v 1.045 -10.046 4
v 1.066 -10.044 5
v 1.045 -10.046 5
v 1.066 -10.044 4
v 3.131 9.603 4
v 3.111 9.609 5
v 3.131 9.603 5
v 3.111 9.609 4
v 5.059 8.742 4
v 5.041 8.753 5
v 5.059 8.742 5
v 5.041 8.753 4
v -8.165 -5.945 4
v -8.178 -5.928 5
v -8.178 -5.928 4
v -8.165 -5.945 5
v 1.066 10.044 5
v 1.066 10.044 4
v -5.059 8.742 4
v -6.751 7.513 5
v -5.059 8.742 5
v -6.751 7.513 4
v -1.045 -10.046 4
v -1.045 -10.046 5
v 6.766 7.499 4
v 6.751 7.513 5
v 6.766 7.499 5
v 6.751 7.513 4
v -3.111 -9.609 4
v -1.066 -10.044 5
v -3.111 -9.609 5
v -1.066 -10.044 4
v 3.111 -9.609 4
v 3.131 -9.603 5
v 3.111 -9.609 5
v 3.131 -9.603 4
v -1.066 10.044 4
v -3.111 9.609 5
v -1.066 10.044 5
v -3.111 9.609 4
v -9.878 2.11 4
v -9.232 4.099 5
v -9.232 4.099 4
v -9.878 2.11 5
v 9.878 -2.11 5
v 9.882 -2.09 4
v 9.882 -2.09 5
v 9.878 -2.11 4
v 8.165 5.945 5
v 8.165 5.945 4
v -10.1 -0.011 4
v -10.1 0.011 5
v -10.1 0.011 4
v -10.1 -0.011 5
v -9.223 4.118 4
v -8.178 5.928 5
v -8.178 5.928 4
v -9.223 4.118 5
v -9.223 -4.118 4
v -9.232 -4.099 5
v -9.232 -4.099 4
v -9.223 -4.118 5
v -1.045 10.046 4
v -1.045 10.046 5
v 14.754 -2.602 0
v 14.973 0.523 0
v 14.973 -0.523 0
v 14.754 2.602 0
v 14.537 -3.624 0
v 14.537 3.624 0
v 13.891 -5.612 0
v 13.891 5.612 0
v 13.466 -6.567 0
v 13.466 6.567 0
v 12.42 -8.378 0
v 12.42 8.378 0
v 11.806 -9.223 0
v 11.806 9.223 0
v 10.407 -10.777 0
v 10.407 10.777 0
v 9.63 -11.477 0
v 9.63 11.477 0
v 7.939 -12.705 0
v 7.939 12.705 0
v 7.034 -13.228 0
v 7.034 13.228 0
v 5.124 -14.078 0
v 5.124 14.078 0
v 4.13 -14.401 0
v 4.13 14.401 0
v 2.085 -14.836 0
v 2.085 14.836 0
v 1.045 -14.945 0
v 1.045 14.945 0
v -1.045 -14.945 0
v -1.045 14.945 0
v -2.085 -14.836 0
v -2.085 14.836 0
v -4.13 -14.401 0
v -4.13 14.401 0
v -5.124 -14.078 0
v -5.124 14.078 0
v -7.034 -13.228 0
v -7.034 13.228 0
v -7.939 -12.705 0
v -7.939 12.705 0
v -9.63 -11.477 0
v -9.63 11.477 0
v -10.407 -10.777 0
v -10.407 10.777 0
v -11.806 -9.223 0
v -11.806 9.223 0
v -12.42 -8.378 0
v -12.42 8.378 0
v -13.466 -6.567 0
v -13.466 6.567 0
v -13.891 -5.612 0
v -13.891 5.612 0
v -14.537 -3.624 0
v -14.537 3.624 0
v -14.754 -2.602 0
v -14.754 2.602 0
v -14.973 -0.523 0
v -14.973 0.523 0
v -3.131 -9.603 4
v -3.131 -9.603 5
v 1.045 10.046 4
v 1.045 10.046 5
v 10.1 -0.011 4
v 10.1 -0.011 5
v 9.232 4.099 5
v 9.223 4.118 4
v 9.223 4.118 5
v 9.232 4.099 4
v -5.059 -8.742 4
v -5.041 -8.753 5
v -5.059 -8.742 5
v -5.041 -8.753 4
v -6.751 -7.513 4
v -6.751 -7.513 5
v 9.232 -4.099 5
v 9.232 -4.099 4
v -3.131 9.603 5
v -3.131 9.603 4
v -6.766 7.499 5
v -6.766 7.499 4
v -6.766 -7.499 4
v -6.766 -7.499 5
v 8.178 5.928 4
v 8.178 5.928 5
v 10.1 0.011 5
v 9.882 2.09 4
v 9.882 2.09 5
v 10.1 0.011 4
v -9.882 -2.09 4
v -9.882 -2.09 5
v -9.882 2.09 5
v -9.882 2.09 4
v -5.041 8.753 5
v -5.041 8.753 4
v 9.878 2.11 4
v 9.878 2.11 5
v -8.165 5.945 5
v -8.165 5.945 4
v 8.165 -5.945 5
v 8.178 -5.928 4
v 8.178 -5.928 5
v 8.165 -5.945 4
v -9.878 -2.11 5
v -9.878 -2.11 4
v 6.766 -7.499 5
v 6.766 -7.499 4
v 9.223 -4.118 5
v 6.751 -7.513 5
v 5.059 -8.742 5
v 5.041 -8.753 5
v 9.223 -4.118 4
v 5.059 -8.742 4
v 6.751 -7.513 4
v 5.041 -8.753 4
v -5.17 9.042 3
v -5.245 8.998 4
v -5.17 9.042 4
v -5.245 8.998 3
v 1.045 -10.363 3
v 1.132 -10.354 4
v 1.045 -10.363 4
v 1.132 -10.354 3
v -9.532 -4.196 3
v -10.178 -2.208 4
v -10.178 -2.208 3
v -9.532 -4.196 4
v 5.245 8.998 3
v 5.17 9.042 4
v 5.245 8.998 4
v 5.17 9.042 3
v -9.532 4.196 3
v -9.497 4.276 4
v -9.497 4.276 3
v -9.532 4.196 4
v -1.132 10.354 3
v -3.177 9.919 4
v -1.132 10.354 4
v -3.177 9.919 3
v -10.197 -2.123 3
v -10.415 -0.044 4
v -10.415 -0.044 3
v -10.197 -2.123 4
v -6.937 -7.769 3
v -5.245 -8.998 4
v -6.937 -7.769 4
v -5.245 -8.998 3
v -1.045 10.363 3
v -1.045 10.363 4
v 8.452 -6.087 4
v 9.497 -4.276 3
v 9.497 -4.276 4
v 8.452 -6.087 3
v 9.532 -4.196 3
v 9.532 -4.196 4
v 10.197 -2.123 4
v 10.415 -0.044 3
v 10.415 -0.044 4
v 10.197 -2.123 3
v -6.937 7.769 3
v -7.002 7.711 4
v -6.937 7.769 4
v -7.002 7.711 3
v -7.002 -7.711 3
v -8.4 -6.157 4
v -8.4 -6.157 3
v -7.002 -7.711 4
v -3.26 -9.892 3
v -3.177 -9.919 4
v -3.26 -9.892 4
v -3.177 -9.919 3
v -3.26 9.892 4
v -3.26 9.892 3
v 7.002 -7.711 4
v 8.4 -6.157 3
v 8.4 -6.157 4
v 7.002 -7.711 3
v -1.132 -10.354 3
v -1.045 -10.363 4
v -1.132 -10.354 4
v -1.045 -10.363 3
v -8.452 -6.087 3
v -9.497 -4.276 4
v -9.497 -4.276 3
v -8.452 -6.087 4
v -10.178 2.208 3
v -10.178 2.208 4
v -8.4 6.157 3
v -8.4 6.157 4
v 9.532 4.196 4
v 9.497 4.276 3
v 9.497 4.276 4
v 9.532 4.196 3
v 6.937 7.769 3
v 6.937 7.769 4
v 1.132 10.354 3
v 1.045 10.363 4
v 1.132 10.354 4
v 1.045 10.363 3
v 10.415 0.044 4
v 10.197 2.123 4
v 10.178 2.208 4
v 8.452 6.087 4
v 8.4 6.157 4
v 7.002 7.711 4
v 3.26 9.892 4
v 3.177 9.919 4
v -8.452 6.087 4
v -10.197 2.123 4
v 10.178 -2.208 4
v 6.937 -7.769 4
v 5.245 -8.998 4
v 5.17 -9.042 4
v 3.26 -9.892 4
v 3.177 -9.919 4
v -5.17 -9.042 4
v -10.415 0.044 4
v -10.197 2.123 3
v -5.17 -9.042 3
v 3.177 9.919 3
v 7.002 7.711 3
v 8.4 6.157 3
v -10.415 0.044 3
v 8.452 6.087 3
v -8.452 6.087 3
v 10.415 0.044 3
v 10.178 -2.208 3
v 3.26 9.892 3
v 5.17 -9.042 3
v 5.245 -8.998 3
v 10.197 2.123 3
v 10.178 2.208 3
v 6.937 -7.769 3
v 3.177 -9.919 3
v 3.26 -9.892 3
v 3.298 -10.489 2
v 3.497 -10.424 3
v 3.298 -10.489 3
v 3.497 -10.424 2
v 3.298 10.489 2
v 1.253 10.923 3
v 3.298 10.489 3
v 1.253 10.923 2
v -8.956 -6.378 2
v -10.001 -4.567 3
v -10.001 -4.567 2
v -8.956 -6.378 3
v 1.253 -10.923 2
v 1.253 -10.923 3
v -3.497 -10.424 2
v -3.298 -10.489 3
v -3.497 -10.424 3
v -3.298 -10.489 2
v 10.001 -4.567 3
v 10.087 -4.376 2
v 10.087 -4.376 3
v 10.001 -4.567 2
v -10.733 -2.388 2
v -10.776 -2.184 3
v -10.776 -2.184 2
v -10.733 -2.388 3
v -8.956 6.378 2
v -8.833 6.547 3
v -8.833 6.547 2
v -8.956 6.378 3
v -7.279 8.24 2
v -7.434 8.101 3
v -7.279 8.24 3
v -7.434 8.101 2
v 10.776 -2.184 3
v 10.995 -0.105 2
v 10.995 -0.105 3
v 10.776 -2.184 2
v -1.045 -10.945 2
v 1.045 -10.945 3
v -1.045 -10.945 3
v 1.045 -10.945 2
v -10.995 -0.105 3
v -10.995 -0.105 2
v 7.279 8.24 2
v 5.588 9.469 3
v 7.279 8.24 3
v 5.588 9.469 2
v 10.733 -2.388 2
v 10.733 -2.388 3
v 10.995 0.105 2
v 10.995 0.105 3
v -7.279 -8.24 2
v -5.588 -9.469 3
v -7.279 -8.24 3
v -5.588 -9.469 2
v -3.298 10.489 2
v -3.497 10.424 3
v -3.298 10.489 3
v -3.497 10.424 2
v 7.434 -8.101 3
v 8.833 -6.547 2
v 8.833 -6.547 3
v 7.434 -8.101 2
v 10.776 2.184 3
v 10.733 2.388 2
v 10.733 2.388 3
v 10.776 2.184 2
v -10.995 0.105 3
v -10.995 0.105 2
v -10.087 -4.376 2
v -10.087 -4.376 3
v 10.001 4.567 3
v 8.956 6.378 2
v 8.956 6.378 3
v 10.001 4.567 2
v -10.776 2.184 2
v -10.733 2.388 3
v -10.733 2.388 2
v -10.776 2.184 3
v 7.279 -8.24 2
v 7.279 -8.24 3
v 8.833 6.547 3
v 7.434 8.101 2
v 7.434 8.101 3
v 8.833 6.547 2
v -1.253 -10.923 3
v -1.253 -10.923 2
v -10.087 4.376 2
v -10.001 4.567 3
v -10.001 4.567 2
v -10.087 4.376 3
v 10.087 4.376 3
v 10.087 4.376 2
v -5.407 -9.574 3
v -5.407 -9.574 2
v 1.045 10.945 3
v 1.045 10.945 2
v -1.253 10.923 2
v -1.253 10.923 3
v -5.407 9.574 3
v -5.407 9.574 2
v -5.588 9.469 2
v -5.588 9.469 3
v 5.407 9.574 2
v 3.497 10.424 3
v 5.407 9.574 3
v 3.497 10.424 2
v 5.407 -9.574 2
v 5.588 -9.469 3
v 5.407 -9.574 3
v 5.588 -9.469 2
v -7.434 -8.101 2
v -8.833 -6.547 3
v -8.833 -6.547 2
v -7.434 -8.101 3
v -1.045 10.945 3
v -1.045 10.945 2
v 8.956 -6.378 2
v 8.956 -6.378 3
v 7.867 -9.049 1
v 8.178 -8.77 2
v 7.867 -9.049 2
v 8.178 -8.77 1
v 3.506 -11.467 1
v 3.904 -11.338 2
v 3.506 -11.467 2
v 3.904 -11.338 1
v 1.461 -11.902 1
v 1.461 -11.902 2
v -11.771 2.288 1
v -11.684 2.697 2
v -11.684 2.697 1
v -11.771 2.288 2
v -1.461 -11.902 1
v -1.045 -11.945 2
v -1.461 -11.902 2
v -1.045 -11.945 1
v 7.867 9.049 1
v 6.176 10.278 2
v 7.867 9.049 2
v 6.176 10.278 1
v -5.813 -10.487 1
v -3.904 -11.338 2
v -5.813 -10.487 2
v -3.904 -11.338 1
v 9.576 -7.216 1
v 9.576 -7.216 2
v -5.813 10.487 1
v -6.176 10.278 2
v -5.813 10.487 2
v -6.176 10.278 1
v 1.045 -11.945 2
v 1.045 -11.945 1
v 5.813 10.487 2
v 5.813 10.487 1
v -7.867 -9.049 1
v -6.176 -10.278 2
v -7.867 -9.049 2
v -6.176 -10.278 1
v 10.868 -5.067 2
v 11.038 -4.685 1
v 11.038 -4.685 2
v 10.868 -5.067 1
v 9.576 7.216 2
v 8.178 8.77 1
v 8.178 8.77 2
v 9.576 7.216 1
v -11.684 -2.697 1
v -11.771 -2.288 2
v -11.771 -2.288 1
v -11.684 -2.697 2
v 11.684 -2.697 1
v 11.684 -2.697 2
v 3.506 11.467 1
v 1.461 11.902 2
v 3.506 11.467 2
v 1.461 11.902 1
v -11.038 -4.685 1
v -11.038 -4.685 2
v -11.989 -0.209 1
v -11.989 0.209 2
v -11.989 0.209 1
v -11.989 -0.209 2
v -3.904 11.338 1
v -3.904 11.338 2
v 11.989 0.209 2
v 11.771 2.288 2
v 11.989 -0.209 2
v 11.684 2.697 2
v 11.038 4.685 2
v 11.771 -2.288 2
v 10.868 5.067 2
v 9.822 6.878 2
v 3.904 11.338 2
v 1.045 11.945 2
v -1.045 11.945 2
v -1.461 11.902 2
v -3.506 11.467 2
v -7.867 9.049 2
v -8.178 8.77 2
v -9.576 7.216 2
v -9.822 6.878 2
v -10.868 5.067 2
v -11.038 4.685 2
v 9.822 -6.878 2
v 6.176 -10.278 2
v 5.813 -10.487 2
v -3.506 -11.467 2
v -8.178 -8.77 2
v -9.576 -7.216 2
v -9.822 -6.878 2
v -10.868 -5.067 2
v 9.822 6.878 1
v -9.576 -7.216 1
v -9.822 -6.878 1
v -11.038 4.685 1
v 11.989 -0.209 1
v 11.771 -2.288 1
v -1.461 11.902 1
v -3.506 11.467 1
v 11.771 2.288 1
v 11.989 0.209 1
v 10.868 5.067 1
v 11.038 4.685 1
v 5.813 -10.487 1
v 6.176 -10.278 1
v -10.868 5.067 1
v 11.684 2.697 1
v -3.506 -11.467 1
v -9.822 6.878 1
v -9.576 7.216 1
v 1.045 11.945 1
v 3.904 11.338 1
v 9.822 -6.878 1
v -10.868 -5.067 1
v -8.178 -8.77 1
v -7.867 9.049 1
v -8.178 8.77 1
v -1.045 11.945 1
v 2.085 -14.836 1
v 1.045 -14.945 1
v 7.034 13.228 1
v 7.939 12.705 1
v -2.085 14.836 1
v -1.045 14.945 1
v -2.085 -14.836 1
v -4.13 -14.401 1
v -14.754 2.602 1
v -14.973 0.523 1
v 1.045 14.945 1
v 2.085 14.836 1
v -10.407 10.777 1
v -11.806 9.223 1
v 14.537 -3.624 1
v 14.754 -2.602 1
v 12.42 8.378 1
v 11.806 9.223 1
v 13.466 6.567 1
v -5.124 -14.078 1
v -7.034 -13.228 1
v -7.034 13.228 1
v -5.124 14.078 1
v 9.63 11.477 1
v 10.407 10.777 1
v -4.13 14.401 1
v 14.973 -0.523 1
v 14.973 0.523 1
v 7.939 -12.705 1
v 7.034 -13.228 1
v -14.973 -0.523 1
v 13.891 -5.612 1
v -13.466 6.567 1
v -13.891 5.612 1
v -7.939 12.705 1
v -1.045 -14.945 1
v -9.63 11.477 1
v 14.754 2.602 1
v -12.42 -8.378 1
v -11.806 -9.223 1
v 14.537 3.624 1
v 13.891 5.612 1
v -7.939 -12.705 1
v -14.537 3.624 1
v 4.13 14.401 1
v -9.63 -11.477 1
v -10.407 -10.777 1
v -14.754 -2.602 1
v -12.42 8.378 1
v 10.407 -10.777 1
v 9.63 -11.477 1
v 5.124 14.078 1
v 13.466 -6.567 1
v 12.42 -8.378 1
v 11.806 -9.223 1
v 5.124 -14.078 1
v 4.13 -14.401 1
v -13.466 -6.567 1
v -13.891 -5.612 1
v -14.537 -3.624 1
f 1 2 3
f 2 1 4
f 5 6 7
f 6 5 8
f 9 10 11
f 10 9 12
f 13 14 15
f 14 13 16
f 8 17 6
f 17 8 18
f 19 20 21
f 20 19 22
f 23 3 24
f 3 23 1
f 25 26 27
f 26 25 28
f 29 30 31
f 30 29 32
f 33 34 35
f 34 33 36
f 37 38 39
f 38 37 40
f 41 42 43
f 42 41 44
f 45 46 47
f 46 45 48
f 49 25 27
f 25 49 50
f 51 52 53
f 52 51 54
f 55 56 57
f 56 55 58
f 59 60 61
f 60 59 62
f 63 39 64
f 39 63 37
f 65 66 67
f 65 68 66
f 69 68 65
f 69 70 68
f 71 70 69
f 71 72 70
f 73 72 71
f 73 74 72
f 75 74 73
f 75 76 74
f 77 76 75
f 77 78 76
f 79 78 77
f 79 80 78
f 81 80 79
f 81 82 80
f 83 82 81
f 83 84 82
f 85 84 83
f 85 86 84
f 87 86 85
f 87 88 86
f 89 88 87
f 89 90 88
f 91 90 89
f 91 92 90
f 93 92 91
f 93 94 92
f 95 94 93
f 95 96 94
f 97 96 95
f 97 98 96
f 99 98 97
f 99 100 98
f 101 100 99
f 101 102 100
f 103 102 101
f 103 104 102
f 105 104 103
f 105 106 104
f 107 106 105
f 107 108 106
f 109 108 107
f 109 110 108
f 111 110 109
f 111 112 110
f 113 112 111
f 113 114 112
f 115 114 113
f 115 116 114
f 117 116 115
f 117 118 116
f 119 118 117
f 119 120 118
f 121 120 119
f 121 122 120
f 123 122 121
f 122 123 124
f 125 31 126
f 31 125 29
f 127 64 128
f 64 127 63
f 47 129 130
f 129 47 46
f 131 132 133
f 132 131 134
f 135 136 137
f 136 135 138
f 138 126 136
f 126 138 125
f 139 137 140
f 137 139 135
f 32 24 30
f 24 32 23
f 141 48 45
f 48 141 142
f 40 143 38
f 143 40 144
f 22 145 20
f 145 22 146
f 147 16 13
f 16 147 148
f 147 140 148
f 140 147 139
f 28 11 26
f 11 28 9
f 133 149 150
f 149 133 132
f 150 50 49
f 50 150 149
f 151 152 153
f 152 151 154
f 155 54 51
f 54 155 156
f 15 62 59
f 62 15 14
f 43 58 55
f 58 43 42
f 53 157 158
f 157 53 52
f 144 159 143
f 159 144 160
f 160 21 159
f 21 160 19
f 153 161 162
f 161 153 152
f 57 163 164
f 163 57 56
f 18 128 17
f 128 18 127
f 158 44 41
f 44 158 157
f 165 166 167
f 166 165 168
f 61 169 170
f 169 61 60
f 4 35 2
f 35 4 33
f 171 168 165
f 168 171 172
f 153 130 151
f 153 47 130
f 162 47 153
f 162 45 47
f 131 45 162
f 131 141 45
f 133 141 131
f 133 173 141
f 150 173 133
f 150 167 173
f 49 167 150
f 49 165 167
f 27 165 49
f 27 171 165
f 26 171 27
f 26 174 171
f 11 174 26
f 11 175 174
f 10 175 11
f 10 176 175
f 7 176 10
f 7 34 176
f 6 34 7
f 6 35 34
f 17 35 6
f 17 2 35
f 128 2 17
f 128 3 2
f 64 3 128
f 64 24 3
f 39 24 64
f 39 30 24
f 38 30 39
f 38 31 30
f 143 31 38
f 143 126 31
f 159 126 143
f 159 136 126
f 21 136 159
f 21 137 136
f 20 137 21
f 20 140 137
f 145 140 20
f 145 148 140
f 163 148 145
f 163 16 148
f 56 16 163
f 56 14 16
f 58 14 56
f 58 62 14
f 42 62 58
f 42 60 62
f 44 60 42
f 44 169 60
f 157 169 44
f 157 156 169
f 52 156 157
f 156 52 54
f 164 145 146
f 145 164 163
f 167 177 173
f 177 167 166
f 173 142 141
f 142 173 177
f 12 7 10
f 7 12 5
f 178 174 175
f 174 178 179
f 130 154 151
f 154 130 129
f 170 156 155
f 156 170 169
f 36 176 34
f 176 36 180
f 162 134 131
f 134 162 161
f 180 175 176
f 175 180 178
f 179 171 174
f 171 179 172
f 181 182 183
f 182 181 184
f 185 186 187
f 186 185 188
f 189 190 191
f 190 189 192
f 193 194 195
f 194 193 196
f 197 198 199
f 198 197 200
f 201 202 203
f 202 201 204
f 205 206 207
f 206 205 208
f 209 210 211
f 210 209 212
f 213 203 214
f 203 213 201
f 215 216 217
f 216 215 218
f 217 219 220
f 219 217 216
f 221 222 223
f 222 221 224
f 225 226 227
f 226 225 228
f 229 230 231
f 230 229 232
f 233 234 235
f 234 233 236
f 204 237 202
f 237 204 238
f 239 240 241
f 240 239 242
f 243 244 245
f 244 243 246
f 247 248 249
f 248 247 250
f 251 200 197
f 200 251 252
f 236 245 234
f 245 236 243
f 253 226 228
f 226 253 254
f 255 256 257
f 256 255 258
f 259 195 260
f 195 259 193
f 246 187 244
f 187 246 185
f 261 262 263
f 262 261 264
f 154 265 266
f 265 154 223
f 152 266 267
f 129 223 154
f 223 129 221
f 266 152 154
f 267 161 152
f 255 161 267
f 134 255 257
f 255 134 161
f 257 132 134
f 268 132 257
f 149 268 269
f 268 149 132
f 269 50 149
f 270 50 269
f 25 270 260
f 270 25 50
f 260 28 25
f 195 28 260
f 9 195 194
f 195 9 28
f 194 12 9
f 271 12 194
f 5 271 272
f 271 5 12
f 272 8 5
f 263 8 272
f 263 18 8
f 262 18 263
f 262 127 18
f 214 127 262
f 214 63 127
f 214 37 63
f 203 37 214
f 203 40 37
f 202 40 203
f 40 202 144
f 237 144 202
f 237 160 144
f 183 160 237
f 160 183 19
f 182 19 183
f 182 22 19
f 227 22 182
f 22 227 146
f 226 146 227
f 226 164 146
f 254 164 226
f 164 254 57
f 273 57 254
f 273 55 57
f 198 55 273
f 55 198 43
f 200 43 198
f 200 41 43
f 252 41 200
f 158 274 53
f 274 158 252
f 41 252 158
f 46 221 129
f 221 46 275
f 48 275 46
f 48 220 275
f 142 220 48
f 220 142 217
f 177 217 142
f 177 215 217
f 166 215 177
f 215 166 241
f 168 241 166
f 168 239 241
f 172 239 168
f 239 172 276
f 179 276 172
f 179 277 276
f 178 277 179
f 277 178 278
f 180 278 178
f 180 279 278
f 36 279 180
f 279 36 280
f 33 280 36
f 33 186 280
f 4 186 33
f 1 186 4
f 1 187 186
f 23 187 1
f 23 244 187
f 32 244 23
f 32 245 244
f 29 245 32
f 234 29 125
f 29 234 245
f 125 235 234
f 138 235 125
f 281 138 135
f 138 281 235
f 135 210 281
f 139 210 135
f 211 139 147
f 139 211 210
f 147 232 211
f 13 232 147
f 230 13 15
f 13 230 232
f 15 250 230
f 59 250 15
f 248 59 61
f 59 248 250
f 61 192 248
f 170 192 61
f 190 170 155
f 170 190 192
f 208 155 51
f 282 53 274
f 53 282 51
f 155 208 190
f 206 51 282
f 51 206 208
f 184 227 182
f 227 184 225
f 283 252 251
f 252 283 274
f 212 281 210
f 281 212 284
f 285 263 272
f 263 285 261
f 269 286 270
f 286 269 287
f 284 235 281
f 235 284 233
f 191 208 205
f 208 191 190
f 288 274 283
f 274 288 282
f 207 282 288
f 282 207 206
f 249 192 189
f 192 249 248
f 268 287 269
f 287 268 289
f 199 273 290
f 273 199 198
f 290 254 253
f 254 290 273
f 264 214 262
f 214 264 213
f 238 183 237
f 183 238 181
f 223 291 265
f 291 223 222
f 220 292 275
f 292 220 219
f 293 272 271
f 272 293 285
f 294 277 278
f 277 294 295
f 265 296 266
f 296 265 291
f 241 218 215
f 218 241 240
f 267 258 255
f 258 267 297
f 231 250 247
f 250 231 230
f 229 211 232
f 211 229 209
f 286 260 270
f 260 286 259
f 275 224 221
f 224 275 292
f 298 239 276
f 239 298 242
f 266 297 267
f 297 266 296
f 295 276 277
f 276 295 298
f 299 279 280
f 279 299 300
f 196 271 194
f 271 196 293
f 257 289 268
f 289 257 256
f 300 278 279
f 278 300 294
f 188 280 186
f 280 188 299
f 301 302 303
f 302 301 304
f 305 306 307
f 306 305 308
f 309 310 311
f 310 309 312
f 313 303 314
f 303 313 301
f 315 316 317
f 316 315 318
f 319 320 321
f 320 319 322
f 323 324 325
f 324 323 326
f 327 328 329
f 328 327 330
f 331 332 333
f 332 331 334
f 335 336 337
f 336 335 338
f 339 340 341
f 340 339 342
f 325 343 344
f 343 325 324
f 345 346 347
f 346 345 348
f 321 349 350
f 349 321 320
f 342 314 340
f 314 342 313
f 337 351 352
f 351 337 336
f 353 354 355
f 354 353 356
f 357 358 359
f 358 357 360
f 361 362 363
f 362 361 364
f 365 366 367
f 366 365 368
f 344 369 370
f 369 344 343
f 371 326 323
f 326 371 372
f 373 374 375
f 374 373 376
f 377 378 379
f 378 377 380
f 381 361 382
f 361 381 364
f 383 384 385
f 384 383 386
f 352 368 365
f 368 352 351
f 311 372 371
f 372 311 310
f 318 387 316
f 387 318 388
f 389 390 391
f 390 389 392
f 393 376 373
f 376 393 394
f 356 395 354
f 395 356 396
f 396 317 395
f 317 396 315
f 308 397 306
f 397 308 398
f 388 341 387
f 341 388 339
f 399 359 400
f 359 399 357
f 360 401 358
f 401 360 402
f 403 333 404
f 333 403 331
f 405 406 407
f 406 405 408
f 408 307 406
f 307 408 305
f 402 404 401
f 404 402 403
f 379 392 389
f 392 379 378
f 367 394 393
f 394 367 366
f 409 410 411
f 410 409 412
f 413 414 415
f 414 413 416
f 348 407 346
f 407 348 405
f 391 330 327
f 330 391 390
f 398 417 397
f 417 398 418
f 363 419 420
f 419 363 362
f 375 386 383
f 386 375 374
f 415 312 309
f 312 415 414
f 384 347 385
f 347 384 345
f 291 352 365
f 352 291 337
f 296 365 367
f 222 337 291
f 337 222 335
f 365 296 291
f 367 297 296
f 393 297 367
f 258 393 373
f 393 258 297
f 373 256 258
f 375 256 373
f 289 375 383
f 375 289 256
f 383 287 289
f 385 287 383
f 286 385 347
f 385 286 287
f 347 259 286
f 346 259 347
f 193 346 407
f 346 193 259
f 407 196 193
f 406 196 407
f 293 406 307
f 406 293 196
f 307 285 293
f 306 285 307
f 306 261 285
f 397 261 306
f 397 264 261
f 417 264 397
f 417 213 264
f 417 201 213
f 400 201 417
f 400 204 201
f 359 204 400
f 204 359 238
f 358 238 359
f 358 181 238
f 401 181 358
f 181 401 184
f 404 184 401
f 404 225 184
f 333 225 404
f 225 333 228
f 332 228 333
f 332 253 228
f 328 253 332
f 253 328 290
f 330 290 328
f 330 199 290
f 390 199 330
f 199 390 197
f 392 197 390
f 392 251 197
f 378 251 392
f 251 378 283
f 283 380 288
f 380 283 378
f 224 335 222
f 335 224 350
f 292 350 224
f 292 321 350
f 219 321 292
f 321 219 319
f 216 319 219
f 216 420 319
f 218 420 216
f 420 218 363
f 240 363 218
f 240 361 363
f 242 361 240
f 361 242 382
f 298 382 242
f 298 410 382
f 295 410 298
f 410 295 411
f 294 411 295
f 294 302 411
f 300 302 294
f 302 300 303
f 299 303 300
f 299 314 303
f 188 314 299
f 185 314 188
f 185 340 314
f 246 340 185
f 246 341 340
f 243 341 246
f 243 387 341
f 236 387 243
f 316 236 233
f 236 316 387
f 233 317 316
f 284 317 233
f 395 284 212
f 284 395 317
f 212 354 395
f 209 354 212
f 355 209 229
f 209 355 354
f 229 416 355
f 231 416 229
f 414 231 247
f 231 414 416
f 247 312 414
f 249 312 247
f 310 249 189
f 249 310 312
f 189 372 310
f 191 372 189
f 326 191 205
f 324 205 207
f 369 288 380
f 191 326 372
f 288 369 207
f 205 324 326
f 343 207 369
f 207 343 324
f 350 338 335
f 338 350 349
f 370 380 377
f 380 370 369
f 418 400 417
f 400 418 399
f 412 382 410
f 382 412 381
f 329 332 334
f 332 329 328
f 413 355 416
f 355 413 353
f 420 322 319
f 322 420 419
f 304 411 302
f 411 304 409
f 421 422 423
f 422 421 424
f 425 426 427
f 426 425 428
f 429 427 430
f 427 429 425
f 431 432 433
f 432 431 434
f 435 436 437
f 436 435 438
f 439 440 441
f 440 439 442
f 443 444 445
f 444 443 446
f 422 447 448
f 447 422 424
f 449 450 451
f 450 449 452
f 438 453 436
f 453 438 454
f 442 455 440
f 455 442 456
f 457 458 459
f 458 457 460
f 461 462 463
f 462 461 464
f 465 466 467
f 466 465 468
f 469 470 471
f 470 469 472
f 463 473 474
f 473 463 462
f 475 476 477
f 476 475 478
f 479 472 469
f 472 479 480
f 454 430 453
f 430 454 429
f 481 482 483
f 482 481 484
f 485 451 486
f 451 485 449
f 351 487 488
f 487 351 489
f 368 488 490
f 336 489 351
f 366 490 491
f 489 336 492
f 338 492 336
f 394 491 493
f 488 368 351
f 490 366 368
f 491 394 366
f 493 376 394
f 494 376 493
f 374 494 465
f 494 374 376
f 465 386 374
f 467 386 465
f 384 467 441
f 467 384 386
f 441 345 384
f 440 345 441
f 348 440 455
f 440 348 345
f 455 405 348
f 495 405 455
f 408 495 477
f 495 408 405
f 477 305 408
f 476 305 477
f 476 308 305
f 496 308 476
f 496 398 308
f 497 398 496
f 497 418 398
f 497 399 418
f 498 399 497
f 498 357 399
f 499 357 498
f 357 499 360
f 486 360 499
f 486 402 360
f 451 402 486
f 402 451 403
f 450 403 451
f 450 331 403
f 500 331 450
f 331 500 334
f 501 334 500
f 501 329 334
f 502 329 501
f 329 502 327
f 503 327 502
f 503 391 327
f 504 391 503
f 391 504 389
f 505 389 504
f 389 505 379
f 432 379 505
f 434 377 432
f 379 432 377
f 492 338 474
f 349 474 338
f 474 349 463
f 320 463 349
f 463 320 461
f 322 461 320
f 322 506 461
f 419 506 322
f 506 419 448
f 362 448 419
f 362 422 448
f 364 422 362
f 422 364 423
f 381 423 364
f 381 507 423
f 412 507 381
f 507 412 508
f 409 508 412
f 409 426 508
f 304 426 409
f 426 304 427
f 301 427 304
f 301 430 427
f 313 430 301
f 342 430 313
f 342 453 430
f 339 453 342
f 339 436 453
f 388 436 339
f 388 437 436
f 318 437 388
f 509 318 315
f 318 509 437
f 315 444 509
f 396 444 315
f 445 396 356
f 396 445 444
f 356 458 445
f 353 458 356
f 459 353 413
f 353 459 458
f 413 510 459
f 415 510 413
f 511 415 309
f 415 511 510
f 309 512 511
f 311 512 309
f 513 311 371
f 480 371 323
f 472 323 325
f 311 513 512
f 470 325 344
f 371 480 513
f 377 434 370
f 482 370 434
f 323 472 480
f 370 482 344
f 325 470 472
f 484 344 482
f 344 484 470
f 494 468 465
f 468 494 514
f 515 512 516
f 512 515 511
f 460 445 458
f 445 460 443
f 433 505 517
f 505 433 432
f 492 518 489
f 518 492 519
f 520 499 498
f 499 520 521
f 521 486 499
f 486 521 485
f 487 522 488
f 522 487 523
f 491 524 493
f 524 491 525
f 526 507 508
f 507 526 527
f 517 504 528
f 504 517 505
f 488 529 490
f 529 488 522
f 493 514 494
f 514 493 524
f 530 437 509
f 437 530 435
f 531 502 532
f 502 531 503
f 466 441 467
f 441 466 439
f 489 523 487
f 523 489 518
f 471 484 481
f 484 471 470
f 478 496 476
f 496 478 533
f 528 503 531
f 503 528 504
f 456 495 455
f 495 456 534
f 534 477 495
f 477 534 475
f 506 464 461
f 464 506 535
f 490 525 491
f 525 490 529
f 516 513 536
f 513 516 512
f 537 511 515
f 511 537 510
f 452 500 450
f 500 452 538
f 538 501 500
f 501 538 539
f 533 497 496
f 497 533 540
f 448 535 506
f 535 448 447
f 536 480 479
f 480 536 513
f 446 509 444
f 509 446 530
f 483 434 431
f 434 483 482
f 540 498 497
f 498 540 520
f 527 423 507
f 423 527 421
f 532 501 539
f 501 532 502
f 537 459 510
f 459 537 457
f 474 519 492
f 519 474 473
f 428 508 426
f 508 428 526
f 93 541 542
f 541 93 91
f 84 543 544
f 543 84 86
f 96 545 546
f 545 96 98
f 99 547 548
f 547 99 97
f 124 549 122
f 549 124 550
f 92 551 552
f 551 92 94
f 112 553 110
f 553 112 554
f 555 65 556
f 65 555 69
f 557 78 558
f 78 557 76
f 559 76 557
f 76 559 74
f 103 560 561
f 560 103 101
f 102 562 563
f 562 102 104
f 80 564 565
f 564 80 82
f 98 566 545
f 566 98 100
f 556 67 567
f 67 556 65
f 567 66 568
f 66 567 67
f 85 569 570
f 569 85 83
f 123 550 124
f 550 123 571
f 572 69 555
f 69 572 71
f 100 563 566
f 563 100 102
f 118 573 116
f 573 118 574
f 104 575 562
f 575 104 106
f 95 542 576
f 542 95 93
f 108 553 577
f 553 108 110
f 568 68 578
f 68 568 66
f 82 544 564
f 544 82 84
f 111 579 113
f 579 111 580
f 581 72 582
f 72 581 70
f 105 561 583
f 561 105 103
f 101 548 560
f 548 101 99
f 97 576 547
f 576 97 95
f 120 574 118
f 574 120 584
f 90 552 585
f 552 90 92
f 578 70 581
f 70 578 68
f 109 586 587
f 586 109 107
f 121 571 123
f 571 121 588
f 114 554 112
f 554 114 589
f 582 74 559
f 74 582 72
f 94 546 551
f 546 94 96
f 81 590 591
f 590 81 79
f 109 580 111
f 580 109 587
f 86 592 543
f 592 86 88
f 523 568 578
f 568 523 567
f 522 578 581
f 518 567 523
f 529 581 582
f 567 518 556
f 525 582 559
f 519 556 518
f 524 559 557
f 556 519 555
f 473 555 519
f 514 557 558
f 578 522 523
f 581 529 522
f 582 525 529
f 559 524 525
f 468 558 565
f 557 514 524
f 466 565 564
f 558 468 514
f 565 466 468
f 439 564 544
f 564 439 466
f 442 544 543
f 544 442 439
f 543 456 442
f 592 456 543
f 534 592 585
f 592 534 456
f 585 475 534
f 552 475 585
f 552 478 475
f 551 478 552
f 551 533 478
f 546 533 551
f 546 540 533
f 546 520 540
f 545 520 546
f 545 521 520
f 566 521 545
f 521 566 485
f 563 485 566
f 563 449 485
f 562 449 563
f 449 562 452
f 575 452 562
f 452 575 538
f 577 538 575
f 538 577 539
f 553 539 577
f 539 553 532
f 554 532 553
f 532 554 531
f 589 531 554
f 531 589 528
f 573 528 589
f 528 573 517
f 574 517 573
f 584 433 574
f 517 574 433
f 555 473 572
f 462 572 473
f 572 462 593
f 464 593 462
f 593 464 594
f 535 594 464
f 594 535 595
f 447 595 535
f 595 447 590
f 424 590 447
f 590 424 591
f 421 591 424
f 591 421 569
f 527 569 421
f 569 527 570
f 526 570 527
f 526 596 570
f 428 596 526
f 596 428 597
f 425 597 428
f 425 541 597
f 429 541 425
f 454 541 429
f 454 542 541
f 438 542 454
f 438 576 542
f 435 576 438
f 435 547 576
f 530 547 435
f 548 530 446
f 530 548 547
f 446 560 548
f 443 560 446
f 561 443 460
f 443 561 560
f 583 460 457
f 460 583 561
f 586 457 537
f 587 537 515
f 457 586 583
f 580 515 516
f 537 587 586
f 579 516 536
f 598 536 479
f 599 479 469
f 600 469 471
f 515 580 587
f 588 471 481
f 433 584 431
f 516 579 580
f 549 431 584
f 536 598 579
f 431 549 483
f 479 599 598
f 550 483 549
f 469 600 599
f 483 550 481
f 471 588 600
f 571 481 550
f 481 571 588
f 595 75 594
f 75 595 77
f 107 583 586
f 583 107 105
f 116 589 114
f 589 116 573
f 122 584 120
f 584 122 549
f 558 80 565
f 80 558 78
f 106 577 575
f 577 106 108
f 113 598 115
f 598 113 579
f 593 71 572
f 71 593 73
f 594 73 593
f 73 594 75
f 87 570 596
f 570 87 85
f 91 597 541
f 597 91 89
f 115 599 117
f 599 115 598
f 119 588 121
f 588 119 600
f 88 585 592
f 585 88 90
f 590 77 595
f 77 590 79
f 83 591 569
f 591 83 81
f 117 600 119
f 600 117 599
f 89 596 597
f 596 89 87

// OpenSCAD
union() {
    union() {
        linear_extrude(height=5) {
            offset(r=0.10102051443364402) {
                circle(r=10);
            };
        };
        linear_extrude(height=4) {
            offset(r=0.41742430504416006) {
                circle(r=10);
            };
        };
        linear_extrude(height=3) {
            offset(r=0.9999999999999998) {
                circle(r=10);
            };
        };
        linear_extrude(height=2) {
            offset(r=2.000000000000001) {
                circle(r=10);
            };
        };
        linear_extrude(height=1) {
            offset(r=5) {
                circle(r=10);
            };
        };
    };
    %translate(v=[0, 0, 5]) {
        cylinder(r=10, h=10, center=true);
    };
};
